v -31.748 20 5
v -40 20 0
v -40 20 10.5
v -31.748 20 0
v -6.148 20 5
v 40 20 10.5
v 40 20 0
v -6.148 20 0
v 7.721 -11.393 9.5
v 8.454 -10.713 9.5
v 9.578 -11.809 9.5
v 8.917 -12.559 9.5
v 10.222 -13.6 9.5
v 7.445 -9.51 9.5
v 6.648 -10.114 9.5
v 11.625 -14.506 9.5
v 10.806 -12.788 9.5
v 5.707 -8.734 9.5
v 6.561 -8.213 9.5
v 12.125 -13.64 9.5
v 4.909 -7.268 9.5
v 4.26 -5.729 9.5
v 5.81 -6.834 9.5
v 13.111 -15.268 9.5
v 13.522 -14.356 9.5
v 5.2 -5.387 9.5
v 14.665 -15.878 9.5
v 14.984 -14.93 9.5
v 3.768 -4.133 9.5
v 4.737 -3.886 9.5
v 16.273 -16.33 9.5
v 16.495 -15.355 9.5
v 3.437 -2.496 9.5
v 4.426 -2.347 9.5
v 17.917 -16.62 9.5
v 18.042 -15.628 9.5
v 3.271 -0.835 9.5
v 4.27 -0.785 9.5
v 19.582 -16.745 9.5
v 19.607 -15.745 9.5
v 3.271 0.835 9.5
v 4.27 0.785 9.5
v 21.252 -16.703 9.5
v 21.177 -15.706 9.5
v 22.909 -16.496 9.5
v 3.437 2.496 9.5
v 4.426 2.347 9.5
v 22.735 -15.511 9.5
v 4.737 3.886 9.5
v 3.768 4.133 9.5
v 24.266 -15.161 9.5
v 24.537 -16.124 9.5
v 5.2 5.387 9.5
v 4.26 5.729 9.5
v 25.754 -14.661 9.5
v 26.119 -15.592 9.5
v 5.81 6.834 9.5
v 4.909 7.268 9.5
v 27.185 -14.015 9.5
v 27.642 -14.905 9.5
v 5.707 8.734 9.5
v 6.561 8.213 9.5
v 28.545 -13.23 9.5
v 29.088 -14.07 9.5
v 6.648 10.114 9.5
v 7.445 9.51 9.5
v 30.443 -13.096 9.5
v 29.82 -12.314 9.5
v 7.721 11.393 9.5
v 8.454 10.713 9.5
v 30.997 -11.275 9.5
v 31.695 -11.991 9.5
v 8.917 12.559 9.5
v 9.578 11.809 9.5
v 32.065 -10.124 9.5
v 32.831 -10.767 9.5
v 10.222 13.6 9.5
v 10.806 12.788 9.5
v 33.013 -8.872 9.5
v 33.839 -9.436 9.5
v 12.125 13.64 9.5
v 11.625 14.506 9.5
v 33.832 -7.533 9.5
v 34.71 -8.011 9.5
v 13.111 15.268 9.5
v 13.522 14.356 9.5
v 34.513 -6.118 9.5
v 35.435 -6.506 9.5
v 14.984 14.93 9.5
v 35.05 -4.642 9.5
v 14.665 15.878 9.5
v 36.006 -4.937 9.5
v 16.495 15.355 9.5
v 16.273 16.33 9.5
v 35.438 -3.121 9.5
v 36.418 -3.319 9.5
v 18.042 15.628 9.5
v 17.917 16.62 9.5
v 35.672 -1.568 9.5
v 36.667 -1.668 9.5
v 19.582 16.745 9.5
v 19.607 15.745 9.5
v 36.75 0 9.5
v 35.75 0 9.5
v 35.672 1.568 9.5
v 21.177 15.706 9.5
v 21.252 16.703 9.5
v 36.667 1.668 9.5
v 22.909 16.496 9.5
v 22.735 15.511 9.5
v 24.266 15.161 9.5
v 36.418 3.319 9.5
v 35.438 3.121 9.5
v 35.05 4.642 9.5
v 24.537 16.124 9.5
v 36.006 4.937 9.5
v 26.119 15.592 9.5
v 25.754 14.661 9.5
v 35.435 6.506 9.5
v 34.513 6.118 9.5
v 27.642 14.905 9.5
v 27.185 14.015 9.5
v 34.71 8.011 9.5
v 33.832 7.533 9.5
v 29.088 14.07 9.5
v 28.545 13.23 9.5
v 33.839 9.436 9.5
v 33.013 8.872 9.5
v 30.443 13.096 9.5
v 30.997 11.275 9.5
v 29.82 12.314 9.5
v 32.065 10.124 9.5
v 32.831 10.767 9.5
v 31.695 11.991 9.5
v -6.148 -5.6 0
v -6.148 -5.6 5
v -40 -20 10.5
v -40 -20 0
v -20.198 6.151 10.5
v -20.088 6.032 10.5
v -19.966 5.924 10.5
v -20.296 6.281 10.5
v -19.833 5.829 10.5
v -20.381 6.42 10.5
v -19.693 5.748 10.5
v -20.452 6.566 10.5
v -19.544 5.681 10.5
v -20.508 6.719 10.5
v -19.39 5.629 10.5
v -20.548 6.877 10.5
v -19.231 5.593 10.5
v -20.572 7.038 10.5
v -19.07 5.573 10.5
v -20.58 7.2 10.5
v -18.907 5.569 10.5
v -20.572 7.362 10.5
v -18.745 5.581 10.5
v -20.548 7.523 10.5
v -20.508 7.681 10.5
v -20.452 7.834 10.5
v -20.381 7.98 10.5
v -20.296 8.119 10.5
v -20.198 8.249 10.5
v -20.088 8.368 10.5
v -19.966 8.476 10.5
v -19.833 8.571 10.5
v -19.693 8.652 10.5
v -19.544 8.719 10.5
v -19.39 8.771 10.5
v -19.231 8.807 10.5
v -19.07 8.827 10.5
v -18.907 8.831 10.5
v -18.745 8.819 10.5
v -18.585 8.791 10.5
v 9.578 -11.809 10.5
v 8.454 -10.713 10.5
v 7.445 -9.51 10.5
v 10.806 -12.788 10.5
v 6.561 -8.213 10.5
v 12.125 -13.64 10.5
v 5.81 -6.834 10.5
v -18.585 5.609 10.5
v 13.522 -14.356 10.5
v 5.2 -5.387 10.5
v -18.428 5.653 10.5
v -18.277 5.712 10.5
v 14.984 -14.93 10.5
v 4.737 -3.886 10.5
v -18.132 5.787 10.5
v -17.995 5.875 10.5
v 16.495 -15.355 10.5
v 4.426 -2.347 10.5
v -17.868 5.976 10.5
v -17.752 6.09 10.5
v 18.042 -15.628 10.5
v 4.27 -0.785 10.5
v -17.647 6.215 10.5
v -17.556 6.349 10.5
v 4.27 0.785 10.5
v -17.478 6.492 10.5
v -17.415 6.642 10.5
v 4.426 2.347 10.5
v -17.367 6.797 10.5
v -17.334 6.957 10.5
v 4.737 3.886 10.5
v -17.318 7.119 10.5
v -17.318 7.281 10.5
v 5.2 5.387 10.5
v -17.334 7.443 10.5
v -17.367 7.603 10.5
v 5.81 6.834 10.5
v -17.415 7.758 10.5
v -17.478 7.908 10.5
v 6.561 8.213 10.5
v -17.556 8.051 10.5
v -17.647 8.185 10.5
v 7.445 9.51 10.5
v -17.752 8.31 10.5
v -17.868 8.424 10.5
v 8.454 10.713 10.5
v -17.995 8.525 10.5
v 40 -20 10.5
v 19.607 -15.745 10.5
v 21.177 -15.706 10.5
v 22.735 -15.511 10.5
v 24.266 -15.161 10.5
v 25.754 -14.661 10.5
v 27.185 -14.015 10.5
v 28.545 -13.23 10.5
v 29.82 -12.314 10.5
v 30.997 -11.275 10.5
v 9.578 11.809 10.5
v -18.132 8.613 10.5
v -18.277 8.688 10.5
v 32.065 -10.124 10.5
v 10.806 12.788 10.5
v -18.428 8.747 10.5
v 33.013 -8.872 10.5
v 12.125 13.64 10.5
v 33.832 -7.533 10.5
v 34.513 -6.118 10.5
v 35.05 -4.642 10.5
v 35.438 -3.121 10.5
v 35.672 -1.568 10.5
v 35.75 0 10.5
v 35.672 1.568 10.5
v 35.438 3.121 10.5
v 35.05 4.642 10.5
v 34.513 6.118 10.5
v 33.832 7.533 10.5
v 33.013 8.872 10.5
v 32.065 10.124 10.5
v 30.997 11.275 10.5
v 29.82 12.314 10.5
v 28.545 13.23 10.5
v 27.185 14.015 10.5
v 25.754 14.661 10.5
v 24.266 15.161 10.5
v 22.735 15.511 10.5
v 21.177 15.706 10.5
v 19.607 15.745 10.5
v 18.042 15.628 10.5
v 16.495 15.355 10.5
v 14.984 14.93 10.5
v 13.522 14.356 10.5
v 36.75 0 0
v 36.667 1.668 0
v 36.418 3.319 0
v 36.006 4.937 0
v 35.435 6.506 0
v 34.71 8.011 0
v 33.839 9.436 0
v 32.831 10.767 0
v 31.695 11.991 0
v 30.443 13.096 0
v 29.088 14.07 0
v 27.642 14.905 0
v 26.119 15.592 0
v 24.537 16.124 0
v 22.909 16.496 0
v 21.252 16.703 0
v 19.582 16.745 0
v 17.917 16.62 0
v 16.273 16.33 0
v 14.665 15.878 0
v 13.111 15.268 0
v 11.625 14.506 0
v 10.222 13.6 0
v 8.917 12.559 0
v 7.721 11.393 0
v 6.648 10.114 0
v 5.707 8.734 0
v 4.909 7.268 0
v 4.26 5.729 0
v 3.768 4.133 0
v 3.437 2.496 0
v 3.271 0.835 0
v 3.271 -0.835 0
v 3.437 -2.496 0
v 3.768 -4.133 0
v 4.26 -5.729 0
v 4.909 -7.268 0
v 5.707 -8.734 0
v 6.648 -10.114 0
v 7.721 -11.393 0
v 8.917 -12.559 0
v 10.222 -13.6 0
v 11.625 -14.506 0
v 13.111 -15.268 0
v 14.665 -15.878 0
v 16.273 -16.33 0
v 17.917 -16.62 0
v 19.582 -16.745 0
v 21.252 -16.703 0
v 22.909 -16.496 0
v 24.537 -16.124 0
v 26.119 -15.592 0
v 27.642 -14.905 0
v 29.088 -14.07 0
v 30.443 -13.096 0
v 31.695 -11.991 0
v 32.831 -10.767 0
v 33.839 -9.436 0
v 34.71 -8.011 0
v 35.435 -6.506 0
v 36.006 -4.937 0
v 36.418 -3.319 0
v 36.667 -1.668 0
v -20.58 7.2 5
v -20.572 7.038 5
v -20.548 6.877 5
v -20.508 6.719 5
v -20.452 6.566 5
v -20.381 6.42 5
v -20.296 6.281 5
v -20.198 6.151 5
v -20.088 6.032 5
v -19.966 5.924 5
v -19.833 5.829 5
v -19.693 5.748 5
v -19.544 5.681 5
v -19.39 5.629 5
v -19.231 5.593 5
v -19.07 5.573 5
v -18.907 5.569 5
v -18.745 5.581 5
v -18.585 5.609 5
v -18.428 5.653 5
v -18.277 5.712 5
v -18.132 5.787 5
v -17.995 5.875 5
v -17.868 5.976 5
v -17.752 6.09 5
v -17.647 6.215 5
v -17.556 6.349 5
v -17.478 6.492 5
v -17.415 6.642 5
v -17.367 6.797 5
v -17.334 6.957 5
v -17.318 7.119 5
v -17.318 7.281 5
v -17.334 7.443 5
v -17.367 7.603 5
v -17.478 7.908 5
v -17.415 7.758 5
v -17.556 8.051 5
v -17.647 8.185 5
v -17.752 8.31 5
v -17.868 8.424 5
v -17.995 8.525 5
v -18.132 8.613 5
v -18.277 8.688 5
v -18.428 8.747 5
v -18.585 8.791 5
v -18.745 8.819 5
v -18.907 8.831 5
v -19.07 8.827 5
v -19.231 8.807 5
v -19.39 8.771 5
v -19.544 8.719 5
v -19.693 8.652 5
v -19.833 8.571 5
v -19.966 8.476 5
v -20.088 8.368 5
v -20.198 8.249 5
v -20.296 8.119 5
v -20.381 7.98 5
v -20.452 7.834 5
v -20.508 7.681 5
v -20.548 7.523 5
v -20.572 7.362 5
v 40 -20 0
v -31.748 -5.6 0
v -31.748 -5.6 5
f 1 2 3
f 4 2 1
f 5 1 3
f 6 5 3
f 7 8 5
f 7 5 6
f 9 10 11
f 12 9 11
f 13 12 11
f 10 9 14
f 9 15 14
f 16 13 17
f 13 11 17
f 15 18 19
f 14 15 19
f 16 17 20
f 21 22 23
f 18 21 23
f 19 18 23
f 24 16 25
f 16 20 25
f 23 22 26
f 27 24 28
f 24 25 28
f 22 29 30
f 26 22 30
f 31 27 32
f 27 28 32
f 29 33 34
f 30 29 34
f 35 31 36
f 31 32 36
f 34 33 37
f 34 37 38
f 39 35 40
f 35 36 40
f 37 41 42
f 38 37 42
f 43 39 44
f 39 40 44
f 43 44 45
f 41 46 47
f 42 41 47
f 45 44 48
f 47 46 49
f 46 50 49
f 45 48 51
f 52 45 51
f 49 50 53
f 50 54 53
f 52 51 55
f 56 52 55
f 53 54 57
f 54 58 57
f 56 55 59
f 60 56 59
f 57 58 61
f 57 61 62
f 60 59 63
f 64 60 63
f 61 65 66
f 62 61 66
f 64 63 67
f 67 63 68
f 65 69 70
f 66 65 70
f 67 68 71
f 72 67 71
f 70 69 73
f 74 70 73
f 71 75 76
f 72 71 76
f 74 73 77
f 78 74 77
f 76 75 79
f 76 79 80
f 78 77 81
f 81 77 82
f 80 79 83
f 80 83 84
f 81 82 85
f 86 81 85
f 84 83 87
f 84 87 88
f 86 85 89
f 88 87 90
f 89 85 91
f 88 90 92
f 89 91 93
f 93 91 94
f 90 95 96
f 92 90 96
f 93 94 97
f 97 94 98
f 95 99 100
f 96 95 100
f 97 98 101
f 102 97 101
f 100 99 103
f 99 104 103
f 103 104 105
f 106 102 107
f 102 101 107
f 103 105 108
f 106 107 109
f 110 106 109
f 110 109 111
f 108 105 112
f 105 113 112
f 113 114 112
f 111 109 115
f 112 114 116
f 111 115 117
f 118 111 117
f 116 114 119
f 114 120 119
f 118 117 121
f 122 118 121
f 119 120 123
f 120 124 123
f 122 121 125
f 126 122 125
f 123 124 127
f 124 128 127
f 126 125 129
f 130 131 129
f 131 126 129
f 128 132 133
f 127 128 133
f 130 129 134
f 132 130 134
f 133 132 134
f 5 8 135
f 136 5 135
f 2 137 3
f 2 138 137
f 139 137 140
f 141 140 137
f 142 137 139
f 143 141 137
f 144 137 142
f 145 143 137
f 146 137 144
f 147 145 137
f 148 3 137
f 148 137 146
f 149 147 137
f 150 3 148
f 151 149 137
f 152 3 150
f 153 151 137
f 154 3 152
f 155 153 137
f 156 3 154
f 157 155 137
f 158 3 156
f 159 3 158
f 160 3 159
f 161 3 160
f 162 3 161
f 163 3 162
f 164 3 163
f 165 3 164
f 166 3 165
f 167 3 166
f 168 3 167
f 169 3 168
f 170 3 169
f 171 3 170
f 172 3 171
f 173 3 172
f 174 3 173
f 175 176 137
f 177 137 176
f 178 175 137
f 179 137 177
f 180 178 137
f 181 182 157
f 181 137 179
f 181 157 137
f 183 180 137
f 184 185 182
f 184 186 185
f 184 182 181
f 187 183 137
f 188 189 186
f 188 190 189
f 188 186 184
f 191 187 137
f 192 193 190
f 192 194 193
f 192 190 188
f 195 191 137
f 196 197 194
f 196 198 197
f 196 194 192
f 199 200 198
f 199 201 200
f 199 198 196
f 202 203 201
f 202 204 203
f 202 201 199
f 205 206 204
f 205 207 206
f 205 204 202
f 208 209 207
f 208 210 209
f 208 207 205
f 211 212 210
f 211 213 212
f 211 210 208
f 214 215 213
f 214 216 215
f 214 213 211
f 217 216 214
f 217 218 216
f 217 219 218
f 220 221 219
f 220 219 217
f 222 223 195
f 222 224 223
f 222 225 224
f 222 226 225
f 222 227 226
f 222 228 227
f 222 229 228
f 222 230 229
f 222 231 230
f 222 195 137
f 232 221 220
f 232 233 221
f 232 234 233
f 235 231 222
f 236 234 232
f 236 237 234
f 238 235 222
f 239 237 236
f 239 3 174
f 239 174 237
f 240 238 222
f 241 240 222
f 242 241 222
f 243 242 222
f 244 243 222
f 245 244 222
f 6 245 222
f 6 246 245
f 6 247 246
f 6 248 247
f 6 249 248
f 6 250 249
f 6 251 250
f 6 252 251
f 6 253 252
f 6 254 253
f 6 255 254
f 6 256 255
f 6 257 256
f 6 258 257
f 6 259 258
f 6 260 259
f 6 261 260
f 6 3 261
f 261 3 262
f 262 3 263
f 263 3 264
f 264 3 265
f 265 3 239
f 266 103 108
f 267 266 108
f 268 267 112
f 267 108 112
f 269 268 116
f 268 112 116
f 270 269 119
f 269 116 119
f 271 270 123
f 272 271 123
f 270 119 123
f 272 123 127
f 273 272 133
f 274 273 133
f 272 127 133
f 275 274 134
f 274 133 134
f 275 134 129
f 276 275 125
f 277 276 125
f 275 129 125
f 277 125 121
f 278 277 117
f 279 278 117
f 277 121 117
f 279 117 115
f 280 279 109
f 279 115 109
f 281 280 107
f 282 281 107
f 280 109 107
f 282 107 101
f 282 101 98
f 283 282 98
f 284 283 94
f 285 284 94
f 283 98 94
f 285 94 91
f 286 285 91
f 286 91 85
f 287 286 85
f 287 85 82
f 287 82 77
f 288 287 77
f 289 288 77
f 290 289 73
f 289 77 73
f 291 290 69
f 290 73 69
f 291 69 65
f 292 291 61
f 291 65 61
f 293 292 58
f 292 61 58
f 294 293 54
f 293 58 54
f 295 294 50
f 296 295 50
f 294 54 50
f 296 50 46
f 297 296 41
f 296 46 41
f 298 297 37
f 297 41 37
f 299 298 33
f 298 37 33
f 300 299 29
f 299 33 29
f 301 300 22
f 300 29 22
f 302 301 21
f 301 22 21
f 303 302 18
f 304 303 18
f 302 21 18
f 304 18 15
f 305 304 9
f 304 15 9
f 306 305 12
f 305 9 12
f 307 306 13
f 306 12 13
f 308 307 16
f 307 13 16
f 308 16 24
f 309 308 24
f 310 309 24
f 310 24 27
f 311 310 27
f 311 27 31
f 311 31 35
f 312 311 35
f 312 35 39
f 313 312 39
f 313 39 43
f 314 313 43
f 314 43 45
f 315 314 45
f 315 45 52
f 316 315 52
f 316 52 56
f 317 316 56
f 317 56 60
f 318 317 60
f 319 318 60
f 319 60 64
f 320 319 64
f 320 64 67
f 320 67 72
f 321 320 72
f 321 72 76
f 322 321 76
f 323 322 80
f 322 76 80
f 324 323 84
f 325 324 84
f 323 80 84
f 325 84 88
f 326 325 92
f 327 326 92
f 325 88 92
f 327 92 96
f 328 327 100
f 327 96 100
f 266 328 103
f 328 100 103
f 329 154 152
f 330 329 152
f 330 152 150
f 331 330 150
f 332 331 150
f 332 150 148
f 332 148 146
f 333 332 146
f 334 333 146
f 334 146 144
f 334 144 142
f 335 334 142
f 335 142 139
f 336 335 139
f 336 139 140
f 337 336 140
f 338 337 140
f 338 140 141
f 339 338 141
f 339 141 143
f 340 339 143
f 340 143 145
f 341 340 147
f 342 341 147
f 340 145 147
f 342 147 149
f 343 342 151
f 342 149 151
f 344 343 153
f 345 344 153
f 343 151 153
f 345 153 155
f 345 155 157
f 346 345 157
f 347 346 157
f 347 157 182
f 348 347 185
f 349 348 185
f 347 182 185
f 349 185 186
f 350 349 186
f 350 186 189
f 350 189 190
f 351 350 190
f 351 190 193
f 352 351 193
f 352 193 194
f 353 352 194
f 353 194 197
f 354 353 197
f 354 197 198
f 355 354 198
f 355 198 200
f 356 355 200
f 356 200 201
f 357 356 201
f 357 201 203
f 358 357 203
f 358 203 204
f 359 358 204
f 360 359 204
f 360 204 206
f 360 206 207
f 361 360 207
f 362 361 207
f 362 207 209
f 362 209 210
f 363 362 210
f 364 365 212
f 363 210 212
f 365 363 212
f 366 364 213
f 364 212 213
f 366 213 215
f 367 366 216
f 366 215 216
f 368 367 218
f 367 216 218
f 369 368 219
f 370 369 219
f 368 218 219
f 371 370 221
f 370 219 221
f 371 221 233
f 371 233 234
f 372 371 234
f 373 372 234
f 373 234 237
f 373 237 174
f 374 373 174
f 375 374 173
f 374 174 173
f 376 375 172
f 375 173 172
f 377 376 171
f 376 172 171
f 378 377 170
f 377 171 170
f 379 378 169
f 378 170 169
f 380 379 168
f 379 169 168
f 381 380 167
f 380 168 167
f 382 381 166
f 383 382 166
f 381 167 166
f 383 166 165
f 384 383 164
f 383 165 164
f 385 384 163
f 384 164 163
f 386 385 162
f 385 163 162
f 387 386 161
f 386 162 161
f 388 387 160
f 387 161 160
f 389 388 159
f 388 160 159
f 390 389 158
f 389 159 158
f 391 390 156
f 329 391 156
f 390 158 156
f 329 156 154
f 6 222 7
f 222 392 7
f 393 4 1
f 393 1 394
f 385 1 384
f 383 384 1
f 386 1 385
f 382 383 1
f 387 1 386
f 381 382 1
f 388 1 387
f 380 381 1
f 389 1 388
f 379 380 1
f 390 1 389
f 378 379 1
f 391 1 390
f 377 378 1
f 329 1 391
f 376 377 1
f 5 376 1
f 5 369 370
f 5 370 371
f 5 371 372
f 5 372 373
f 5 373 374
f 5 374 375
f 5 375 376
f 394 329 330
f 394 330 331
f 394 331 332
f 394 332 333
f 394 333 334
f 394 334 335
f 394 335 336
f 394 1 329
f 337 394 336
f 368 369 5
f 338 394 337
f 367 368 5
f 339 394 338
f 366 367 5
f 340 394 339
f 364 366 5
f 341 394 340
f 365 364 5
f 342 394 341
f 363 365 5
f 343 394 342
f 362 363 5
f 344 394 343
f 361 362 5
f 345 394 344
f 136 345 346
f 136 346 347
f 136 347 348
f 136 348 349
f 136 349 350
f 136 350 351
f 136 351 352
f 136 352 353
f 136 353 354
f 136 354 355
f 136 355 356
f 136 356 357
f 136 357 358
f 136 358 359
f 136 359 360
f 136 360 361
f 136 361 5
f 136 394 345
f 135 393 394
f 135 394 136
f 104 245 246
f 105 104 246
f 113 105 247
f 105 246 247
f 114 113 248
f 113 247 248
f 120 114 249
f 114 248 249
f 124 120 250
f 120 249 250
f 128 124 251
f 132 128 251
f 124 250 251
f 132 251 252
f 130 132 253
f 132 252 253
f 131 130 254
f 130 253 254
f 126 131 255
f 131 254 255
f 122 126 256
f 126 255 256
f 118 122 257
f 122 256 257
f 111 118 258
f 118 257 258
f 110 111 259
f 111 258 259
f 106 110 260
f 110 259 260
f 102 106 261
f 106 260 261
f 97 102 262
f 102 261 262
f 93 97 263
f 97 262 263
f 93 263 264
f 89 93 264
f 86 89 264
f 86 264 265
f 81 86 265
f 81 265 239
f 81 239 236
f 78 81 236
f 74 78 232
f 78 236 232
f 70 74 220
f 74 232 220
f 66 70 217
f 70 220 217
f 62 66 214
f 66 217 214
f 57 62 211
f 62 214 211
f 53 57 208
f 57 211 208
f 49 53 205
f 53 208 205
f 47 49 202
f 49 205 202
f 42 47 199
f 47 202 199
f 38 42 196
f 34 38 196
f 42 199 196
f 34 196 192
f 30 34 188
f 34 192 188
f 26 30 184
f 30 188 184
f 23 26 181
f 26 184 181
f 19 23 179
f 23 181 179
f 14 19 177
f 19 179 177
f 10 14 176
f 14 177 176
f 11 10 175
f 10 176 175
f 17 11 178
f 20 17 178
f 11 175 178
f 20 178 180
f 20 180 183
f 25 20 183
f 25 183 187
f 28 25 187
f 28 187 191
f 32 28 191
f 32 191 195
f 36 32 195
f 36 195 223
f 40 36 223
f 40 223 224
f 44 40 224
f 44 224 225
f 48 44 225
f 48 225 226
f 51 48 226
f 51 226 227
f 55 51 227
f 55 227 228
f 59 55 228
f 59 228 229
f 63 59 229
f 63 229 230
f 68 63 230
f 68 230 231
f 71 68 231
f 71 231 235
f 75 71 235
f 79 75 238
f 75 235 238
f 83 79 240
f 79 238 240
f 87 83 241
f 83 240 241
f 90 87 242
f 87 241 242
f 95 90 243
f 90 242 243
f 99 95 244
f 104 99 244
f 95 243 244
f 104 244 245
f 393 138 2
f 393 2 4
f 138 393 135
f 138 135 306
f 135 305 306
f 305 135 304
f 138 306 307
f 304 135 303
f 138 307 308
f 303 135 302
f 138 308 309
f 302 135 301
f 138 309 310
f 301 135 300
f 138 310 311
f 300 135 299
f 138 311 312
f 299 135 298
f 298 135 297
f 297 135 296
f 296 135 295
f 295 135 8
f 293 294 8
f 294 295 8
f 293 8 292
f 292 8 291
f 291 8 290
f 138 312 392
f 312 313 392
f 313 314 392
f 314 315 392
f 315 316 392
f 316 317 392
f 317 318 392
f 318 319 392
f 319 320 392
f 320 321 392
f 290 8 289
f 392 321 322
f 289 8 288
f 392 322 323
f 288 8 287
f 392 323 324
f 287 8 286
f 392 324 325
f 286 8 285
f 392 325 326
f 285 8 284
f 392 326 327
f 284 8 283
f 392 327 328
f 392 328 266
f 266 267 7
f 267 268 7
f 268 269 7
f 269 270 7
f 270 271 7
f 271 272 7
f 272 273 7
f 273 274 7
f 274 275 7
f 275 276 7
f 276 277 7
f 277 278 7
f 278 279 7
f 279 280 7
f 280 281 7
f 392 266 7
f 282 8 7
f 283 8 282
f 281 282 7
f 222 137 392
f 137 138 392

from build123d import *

# Parameters (mm, degrees)
F0_W      = 80
F0_H      = 40
F1_DEPTH  = 9.5
F2_R      = 16.75
F3_DEPTH  = 9.5
F4_W      = 80
F4_H      = 40
F5_DEPTH  = 1
F6_R      = 15.75
F7_DEPTH  = 1
F9_D      = 3.2639
F8_W      = 25.6
F8_H      = 25.6
F10_DEPTH = 5


with BuildPart() as f1:
    # F0 (on Top) → F1 (new body)
    with BuildSketch(Plane.XY):
        Rectangle(F0_W, F0_H)
    extrude(amount=F1_DEPTH)

    # F2 (on face) → F3 (cut)
    with BuildSketch(Plane.XY.offset(9.5)):
        with Locations((20, 0)):
            Circle(F2_R)
    extrude(amount=-F3_DEPTH, mode=Mode.SUBTRACT)

    # F4 (on face) → F5 (join)
    with BuildSketch(Plane.XY.offset(9.5)):
        Rectangle(F4_W, F4_H)
    extrude(amount=F5_DEPTH)

    # F6 (on face) → F7 (cut)
    with BuildSketch(Plane.XY.offset(10.5)):
        with Locations((20, 0)):
            Circle(F6_R)
    extrude(amount=-F7_DEPTH, mode=Mode.SUBTRACT)

    # F9 (through all)
    with Locations(Plane(origin=(0, 0, 0), x_dir=(1, 0, 0), z_dir=(0, 0, -1))):
        with Locations((-18.9480787635, -7.2)):
            Hole(F9_D / 2)

    # F8 (on face) → F10 (cut)
    with BuildSketch(Plane(origin=(0, 0, 0), x_dir=(1, 0, 0), z_dir=(0, 0, -1))):
        with Locations((-18.9480787635, -7.2)):
            Rectangle(F8_W, F8_H)
    extrude(amount=-F10_DEPTH, mode=Mode.SUBTRACT)


solid = f1.part
